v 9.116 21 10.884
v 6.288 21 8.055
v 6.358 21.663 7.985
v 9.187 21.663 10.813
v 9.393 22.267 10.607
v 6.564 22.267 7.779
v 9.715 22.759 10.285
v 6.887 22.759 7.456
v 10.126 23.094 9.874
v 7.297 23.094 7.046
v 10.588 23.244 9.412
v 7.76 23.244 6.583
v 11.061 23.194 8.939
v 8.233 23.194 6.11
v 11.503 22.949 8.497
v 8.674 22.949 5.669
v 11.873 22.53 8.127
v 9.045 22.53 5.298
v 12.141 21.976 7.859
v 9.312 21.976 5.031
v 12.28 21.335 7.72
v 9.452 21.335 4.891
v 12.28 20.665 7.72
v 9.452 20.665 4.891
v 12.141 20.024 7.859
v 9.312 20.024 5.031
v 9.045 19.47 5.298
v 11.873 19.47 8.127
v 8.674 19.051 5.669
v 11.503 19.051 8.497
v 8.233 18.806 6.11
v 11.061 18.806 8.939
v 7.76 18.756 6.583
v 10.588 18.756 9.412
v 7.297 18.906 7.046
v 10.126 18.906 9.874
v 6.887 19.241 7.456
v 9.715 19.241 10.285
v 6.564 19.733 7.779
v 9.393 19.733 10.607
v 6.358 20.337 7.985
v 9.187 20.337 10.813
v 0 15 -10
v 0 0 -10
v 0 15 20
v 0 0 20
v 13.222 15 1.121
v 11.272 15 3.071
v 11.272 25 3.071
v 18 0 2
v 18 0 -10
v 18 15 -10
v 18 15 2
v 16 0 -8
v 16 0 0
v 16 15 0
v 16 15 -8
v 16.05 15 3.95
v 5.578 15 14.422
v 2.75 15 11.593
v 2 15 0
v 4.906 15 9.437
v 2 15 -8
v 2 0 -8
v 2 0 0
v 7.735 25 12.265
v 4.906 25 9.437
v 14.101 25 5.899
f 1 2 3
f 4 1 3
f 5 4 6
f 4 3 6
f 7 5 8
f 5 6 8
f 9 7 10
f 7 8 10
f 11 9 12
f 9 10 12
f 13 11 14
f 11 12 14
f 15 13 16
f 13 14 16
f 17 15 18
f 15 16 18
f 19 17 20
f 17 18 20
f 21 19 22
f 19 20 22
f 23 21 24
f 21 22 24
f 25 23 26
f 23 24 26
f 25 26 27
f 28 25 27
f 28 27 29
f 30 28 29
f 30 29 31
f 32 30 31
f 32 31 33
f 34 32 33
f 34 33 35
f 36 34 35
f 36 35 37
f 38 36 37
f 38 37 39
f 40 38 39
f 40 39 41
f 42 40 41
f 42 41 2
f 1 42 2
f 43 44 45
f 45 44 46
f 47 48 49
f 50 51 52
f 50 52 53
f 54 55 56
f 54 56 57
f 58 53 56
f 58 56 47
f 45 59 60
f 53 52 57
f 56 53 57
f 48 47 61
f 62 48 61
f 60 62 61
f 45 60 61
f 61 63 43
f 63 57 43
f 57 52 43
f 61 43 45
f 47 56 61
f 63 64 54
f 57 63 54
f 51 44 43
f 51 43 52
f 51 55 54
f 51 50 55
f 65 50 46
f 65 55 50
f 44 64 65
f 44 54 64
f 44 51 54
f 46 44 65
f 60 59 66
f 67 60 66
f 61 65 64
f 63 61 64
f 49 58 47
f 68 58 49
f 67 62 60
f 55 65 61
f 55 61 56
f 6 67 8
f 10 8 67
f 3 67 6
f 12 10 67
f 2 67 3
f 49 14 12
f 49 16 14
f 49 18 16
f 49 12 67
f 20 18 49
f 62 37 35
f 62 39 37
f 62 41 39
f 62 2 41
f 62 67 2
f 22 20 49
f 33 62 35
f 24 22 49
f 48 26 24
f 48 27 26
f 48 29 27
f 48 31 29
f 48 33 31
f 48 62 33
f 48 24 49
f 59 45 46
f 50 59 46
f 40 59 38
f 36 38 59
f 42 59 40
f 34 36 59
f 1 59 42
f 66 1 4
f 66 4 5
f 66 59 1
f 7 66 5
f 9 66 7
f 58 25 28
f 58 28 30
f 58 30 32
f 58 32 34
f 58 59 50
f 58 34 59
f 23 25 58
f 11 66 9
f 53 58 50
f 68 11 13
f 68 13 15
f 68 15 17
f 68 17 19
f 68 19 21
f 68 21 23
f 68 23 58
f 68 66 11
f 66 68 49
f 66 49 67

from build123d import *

# Parameters (mm, degrees)
SKETCH_1_W          = 14
SKETCH_1_H          = 8
EXTRUDE_1_DEPTH     = 15
EXTRUDE_2_DEPTH     = 10
SKETCH_4_R          = 2.25
CUT_EXTRUDE_1_DEPTH = 5.5
EXTRUDE_3_DEPTH     = 4


with BuildPart() as part:
    # 草图1 → 凸台-拉伸1 (new body)
    with BuildSketch(Plane(origin=(0, 0, 0), x_dir=(1, 0, 0), z_dir=(0, 1, 0))):
        Polygon((0, 0), (0, 10), (18, 10), (18, -2), (0, -20), align=None)
        with Locations((9, 4)):
            Rectangle(SKETCH_1_W, SKETCH_1_H, mode=Mode.SUBTRACT)
    extrude(amount=EXTRUDE_1_DEPTH)

    # 草图2 → 凸台-拉伸2 (add)
    with BuildSketch(Plane(origin=(0, 15, 0), x_dir=(1, 0, 0), z_dir=(0, 1, 0))):
        Polygon((11.272196348, -3.070949403), (14.100623473, -5.899376527), (7.734731659, -12.265268341), (4.906304534, -9.436841216), align=None)
    extrude(amount=EXTRUDE_2_DEPTH)

    # 草图4 → 切除-拉伸1 (cut)
    with BuildSketch(Plane(origin=(7.171572875, 0, 7.171572875), x_dir=(-0.707106781, 0, 0.707106781), z_dir=(-0.707106781, 0, -0.707106781))):
        with Locations((-1, 21)):
            Circle(SKETCH_4_R)
    extrude(amount=-CUT_EXTRUDE_1_DEPTH, mode=Mode.SUBTRACT)

    # 草图5 → 凸台-拉伸3 (add)
    with BuildSketch(Plane(origin=(10, 0, 10), x_dir=(0.707106781, 0, -0.707106781), z_dir=(0.707106781, 0, 0.707106781))):
        Polygon((5.799157329, 25), (5.799157329, 15), (8.556432914, 15), align=None)
        Polygon((-3.20357321, 25), (-3.20357321, 15), (-6.25343363, 15), align=None)
    extrude(amount=-EXTRUDE_3_DEPTH)


solid = part.part
